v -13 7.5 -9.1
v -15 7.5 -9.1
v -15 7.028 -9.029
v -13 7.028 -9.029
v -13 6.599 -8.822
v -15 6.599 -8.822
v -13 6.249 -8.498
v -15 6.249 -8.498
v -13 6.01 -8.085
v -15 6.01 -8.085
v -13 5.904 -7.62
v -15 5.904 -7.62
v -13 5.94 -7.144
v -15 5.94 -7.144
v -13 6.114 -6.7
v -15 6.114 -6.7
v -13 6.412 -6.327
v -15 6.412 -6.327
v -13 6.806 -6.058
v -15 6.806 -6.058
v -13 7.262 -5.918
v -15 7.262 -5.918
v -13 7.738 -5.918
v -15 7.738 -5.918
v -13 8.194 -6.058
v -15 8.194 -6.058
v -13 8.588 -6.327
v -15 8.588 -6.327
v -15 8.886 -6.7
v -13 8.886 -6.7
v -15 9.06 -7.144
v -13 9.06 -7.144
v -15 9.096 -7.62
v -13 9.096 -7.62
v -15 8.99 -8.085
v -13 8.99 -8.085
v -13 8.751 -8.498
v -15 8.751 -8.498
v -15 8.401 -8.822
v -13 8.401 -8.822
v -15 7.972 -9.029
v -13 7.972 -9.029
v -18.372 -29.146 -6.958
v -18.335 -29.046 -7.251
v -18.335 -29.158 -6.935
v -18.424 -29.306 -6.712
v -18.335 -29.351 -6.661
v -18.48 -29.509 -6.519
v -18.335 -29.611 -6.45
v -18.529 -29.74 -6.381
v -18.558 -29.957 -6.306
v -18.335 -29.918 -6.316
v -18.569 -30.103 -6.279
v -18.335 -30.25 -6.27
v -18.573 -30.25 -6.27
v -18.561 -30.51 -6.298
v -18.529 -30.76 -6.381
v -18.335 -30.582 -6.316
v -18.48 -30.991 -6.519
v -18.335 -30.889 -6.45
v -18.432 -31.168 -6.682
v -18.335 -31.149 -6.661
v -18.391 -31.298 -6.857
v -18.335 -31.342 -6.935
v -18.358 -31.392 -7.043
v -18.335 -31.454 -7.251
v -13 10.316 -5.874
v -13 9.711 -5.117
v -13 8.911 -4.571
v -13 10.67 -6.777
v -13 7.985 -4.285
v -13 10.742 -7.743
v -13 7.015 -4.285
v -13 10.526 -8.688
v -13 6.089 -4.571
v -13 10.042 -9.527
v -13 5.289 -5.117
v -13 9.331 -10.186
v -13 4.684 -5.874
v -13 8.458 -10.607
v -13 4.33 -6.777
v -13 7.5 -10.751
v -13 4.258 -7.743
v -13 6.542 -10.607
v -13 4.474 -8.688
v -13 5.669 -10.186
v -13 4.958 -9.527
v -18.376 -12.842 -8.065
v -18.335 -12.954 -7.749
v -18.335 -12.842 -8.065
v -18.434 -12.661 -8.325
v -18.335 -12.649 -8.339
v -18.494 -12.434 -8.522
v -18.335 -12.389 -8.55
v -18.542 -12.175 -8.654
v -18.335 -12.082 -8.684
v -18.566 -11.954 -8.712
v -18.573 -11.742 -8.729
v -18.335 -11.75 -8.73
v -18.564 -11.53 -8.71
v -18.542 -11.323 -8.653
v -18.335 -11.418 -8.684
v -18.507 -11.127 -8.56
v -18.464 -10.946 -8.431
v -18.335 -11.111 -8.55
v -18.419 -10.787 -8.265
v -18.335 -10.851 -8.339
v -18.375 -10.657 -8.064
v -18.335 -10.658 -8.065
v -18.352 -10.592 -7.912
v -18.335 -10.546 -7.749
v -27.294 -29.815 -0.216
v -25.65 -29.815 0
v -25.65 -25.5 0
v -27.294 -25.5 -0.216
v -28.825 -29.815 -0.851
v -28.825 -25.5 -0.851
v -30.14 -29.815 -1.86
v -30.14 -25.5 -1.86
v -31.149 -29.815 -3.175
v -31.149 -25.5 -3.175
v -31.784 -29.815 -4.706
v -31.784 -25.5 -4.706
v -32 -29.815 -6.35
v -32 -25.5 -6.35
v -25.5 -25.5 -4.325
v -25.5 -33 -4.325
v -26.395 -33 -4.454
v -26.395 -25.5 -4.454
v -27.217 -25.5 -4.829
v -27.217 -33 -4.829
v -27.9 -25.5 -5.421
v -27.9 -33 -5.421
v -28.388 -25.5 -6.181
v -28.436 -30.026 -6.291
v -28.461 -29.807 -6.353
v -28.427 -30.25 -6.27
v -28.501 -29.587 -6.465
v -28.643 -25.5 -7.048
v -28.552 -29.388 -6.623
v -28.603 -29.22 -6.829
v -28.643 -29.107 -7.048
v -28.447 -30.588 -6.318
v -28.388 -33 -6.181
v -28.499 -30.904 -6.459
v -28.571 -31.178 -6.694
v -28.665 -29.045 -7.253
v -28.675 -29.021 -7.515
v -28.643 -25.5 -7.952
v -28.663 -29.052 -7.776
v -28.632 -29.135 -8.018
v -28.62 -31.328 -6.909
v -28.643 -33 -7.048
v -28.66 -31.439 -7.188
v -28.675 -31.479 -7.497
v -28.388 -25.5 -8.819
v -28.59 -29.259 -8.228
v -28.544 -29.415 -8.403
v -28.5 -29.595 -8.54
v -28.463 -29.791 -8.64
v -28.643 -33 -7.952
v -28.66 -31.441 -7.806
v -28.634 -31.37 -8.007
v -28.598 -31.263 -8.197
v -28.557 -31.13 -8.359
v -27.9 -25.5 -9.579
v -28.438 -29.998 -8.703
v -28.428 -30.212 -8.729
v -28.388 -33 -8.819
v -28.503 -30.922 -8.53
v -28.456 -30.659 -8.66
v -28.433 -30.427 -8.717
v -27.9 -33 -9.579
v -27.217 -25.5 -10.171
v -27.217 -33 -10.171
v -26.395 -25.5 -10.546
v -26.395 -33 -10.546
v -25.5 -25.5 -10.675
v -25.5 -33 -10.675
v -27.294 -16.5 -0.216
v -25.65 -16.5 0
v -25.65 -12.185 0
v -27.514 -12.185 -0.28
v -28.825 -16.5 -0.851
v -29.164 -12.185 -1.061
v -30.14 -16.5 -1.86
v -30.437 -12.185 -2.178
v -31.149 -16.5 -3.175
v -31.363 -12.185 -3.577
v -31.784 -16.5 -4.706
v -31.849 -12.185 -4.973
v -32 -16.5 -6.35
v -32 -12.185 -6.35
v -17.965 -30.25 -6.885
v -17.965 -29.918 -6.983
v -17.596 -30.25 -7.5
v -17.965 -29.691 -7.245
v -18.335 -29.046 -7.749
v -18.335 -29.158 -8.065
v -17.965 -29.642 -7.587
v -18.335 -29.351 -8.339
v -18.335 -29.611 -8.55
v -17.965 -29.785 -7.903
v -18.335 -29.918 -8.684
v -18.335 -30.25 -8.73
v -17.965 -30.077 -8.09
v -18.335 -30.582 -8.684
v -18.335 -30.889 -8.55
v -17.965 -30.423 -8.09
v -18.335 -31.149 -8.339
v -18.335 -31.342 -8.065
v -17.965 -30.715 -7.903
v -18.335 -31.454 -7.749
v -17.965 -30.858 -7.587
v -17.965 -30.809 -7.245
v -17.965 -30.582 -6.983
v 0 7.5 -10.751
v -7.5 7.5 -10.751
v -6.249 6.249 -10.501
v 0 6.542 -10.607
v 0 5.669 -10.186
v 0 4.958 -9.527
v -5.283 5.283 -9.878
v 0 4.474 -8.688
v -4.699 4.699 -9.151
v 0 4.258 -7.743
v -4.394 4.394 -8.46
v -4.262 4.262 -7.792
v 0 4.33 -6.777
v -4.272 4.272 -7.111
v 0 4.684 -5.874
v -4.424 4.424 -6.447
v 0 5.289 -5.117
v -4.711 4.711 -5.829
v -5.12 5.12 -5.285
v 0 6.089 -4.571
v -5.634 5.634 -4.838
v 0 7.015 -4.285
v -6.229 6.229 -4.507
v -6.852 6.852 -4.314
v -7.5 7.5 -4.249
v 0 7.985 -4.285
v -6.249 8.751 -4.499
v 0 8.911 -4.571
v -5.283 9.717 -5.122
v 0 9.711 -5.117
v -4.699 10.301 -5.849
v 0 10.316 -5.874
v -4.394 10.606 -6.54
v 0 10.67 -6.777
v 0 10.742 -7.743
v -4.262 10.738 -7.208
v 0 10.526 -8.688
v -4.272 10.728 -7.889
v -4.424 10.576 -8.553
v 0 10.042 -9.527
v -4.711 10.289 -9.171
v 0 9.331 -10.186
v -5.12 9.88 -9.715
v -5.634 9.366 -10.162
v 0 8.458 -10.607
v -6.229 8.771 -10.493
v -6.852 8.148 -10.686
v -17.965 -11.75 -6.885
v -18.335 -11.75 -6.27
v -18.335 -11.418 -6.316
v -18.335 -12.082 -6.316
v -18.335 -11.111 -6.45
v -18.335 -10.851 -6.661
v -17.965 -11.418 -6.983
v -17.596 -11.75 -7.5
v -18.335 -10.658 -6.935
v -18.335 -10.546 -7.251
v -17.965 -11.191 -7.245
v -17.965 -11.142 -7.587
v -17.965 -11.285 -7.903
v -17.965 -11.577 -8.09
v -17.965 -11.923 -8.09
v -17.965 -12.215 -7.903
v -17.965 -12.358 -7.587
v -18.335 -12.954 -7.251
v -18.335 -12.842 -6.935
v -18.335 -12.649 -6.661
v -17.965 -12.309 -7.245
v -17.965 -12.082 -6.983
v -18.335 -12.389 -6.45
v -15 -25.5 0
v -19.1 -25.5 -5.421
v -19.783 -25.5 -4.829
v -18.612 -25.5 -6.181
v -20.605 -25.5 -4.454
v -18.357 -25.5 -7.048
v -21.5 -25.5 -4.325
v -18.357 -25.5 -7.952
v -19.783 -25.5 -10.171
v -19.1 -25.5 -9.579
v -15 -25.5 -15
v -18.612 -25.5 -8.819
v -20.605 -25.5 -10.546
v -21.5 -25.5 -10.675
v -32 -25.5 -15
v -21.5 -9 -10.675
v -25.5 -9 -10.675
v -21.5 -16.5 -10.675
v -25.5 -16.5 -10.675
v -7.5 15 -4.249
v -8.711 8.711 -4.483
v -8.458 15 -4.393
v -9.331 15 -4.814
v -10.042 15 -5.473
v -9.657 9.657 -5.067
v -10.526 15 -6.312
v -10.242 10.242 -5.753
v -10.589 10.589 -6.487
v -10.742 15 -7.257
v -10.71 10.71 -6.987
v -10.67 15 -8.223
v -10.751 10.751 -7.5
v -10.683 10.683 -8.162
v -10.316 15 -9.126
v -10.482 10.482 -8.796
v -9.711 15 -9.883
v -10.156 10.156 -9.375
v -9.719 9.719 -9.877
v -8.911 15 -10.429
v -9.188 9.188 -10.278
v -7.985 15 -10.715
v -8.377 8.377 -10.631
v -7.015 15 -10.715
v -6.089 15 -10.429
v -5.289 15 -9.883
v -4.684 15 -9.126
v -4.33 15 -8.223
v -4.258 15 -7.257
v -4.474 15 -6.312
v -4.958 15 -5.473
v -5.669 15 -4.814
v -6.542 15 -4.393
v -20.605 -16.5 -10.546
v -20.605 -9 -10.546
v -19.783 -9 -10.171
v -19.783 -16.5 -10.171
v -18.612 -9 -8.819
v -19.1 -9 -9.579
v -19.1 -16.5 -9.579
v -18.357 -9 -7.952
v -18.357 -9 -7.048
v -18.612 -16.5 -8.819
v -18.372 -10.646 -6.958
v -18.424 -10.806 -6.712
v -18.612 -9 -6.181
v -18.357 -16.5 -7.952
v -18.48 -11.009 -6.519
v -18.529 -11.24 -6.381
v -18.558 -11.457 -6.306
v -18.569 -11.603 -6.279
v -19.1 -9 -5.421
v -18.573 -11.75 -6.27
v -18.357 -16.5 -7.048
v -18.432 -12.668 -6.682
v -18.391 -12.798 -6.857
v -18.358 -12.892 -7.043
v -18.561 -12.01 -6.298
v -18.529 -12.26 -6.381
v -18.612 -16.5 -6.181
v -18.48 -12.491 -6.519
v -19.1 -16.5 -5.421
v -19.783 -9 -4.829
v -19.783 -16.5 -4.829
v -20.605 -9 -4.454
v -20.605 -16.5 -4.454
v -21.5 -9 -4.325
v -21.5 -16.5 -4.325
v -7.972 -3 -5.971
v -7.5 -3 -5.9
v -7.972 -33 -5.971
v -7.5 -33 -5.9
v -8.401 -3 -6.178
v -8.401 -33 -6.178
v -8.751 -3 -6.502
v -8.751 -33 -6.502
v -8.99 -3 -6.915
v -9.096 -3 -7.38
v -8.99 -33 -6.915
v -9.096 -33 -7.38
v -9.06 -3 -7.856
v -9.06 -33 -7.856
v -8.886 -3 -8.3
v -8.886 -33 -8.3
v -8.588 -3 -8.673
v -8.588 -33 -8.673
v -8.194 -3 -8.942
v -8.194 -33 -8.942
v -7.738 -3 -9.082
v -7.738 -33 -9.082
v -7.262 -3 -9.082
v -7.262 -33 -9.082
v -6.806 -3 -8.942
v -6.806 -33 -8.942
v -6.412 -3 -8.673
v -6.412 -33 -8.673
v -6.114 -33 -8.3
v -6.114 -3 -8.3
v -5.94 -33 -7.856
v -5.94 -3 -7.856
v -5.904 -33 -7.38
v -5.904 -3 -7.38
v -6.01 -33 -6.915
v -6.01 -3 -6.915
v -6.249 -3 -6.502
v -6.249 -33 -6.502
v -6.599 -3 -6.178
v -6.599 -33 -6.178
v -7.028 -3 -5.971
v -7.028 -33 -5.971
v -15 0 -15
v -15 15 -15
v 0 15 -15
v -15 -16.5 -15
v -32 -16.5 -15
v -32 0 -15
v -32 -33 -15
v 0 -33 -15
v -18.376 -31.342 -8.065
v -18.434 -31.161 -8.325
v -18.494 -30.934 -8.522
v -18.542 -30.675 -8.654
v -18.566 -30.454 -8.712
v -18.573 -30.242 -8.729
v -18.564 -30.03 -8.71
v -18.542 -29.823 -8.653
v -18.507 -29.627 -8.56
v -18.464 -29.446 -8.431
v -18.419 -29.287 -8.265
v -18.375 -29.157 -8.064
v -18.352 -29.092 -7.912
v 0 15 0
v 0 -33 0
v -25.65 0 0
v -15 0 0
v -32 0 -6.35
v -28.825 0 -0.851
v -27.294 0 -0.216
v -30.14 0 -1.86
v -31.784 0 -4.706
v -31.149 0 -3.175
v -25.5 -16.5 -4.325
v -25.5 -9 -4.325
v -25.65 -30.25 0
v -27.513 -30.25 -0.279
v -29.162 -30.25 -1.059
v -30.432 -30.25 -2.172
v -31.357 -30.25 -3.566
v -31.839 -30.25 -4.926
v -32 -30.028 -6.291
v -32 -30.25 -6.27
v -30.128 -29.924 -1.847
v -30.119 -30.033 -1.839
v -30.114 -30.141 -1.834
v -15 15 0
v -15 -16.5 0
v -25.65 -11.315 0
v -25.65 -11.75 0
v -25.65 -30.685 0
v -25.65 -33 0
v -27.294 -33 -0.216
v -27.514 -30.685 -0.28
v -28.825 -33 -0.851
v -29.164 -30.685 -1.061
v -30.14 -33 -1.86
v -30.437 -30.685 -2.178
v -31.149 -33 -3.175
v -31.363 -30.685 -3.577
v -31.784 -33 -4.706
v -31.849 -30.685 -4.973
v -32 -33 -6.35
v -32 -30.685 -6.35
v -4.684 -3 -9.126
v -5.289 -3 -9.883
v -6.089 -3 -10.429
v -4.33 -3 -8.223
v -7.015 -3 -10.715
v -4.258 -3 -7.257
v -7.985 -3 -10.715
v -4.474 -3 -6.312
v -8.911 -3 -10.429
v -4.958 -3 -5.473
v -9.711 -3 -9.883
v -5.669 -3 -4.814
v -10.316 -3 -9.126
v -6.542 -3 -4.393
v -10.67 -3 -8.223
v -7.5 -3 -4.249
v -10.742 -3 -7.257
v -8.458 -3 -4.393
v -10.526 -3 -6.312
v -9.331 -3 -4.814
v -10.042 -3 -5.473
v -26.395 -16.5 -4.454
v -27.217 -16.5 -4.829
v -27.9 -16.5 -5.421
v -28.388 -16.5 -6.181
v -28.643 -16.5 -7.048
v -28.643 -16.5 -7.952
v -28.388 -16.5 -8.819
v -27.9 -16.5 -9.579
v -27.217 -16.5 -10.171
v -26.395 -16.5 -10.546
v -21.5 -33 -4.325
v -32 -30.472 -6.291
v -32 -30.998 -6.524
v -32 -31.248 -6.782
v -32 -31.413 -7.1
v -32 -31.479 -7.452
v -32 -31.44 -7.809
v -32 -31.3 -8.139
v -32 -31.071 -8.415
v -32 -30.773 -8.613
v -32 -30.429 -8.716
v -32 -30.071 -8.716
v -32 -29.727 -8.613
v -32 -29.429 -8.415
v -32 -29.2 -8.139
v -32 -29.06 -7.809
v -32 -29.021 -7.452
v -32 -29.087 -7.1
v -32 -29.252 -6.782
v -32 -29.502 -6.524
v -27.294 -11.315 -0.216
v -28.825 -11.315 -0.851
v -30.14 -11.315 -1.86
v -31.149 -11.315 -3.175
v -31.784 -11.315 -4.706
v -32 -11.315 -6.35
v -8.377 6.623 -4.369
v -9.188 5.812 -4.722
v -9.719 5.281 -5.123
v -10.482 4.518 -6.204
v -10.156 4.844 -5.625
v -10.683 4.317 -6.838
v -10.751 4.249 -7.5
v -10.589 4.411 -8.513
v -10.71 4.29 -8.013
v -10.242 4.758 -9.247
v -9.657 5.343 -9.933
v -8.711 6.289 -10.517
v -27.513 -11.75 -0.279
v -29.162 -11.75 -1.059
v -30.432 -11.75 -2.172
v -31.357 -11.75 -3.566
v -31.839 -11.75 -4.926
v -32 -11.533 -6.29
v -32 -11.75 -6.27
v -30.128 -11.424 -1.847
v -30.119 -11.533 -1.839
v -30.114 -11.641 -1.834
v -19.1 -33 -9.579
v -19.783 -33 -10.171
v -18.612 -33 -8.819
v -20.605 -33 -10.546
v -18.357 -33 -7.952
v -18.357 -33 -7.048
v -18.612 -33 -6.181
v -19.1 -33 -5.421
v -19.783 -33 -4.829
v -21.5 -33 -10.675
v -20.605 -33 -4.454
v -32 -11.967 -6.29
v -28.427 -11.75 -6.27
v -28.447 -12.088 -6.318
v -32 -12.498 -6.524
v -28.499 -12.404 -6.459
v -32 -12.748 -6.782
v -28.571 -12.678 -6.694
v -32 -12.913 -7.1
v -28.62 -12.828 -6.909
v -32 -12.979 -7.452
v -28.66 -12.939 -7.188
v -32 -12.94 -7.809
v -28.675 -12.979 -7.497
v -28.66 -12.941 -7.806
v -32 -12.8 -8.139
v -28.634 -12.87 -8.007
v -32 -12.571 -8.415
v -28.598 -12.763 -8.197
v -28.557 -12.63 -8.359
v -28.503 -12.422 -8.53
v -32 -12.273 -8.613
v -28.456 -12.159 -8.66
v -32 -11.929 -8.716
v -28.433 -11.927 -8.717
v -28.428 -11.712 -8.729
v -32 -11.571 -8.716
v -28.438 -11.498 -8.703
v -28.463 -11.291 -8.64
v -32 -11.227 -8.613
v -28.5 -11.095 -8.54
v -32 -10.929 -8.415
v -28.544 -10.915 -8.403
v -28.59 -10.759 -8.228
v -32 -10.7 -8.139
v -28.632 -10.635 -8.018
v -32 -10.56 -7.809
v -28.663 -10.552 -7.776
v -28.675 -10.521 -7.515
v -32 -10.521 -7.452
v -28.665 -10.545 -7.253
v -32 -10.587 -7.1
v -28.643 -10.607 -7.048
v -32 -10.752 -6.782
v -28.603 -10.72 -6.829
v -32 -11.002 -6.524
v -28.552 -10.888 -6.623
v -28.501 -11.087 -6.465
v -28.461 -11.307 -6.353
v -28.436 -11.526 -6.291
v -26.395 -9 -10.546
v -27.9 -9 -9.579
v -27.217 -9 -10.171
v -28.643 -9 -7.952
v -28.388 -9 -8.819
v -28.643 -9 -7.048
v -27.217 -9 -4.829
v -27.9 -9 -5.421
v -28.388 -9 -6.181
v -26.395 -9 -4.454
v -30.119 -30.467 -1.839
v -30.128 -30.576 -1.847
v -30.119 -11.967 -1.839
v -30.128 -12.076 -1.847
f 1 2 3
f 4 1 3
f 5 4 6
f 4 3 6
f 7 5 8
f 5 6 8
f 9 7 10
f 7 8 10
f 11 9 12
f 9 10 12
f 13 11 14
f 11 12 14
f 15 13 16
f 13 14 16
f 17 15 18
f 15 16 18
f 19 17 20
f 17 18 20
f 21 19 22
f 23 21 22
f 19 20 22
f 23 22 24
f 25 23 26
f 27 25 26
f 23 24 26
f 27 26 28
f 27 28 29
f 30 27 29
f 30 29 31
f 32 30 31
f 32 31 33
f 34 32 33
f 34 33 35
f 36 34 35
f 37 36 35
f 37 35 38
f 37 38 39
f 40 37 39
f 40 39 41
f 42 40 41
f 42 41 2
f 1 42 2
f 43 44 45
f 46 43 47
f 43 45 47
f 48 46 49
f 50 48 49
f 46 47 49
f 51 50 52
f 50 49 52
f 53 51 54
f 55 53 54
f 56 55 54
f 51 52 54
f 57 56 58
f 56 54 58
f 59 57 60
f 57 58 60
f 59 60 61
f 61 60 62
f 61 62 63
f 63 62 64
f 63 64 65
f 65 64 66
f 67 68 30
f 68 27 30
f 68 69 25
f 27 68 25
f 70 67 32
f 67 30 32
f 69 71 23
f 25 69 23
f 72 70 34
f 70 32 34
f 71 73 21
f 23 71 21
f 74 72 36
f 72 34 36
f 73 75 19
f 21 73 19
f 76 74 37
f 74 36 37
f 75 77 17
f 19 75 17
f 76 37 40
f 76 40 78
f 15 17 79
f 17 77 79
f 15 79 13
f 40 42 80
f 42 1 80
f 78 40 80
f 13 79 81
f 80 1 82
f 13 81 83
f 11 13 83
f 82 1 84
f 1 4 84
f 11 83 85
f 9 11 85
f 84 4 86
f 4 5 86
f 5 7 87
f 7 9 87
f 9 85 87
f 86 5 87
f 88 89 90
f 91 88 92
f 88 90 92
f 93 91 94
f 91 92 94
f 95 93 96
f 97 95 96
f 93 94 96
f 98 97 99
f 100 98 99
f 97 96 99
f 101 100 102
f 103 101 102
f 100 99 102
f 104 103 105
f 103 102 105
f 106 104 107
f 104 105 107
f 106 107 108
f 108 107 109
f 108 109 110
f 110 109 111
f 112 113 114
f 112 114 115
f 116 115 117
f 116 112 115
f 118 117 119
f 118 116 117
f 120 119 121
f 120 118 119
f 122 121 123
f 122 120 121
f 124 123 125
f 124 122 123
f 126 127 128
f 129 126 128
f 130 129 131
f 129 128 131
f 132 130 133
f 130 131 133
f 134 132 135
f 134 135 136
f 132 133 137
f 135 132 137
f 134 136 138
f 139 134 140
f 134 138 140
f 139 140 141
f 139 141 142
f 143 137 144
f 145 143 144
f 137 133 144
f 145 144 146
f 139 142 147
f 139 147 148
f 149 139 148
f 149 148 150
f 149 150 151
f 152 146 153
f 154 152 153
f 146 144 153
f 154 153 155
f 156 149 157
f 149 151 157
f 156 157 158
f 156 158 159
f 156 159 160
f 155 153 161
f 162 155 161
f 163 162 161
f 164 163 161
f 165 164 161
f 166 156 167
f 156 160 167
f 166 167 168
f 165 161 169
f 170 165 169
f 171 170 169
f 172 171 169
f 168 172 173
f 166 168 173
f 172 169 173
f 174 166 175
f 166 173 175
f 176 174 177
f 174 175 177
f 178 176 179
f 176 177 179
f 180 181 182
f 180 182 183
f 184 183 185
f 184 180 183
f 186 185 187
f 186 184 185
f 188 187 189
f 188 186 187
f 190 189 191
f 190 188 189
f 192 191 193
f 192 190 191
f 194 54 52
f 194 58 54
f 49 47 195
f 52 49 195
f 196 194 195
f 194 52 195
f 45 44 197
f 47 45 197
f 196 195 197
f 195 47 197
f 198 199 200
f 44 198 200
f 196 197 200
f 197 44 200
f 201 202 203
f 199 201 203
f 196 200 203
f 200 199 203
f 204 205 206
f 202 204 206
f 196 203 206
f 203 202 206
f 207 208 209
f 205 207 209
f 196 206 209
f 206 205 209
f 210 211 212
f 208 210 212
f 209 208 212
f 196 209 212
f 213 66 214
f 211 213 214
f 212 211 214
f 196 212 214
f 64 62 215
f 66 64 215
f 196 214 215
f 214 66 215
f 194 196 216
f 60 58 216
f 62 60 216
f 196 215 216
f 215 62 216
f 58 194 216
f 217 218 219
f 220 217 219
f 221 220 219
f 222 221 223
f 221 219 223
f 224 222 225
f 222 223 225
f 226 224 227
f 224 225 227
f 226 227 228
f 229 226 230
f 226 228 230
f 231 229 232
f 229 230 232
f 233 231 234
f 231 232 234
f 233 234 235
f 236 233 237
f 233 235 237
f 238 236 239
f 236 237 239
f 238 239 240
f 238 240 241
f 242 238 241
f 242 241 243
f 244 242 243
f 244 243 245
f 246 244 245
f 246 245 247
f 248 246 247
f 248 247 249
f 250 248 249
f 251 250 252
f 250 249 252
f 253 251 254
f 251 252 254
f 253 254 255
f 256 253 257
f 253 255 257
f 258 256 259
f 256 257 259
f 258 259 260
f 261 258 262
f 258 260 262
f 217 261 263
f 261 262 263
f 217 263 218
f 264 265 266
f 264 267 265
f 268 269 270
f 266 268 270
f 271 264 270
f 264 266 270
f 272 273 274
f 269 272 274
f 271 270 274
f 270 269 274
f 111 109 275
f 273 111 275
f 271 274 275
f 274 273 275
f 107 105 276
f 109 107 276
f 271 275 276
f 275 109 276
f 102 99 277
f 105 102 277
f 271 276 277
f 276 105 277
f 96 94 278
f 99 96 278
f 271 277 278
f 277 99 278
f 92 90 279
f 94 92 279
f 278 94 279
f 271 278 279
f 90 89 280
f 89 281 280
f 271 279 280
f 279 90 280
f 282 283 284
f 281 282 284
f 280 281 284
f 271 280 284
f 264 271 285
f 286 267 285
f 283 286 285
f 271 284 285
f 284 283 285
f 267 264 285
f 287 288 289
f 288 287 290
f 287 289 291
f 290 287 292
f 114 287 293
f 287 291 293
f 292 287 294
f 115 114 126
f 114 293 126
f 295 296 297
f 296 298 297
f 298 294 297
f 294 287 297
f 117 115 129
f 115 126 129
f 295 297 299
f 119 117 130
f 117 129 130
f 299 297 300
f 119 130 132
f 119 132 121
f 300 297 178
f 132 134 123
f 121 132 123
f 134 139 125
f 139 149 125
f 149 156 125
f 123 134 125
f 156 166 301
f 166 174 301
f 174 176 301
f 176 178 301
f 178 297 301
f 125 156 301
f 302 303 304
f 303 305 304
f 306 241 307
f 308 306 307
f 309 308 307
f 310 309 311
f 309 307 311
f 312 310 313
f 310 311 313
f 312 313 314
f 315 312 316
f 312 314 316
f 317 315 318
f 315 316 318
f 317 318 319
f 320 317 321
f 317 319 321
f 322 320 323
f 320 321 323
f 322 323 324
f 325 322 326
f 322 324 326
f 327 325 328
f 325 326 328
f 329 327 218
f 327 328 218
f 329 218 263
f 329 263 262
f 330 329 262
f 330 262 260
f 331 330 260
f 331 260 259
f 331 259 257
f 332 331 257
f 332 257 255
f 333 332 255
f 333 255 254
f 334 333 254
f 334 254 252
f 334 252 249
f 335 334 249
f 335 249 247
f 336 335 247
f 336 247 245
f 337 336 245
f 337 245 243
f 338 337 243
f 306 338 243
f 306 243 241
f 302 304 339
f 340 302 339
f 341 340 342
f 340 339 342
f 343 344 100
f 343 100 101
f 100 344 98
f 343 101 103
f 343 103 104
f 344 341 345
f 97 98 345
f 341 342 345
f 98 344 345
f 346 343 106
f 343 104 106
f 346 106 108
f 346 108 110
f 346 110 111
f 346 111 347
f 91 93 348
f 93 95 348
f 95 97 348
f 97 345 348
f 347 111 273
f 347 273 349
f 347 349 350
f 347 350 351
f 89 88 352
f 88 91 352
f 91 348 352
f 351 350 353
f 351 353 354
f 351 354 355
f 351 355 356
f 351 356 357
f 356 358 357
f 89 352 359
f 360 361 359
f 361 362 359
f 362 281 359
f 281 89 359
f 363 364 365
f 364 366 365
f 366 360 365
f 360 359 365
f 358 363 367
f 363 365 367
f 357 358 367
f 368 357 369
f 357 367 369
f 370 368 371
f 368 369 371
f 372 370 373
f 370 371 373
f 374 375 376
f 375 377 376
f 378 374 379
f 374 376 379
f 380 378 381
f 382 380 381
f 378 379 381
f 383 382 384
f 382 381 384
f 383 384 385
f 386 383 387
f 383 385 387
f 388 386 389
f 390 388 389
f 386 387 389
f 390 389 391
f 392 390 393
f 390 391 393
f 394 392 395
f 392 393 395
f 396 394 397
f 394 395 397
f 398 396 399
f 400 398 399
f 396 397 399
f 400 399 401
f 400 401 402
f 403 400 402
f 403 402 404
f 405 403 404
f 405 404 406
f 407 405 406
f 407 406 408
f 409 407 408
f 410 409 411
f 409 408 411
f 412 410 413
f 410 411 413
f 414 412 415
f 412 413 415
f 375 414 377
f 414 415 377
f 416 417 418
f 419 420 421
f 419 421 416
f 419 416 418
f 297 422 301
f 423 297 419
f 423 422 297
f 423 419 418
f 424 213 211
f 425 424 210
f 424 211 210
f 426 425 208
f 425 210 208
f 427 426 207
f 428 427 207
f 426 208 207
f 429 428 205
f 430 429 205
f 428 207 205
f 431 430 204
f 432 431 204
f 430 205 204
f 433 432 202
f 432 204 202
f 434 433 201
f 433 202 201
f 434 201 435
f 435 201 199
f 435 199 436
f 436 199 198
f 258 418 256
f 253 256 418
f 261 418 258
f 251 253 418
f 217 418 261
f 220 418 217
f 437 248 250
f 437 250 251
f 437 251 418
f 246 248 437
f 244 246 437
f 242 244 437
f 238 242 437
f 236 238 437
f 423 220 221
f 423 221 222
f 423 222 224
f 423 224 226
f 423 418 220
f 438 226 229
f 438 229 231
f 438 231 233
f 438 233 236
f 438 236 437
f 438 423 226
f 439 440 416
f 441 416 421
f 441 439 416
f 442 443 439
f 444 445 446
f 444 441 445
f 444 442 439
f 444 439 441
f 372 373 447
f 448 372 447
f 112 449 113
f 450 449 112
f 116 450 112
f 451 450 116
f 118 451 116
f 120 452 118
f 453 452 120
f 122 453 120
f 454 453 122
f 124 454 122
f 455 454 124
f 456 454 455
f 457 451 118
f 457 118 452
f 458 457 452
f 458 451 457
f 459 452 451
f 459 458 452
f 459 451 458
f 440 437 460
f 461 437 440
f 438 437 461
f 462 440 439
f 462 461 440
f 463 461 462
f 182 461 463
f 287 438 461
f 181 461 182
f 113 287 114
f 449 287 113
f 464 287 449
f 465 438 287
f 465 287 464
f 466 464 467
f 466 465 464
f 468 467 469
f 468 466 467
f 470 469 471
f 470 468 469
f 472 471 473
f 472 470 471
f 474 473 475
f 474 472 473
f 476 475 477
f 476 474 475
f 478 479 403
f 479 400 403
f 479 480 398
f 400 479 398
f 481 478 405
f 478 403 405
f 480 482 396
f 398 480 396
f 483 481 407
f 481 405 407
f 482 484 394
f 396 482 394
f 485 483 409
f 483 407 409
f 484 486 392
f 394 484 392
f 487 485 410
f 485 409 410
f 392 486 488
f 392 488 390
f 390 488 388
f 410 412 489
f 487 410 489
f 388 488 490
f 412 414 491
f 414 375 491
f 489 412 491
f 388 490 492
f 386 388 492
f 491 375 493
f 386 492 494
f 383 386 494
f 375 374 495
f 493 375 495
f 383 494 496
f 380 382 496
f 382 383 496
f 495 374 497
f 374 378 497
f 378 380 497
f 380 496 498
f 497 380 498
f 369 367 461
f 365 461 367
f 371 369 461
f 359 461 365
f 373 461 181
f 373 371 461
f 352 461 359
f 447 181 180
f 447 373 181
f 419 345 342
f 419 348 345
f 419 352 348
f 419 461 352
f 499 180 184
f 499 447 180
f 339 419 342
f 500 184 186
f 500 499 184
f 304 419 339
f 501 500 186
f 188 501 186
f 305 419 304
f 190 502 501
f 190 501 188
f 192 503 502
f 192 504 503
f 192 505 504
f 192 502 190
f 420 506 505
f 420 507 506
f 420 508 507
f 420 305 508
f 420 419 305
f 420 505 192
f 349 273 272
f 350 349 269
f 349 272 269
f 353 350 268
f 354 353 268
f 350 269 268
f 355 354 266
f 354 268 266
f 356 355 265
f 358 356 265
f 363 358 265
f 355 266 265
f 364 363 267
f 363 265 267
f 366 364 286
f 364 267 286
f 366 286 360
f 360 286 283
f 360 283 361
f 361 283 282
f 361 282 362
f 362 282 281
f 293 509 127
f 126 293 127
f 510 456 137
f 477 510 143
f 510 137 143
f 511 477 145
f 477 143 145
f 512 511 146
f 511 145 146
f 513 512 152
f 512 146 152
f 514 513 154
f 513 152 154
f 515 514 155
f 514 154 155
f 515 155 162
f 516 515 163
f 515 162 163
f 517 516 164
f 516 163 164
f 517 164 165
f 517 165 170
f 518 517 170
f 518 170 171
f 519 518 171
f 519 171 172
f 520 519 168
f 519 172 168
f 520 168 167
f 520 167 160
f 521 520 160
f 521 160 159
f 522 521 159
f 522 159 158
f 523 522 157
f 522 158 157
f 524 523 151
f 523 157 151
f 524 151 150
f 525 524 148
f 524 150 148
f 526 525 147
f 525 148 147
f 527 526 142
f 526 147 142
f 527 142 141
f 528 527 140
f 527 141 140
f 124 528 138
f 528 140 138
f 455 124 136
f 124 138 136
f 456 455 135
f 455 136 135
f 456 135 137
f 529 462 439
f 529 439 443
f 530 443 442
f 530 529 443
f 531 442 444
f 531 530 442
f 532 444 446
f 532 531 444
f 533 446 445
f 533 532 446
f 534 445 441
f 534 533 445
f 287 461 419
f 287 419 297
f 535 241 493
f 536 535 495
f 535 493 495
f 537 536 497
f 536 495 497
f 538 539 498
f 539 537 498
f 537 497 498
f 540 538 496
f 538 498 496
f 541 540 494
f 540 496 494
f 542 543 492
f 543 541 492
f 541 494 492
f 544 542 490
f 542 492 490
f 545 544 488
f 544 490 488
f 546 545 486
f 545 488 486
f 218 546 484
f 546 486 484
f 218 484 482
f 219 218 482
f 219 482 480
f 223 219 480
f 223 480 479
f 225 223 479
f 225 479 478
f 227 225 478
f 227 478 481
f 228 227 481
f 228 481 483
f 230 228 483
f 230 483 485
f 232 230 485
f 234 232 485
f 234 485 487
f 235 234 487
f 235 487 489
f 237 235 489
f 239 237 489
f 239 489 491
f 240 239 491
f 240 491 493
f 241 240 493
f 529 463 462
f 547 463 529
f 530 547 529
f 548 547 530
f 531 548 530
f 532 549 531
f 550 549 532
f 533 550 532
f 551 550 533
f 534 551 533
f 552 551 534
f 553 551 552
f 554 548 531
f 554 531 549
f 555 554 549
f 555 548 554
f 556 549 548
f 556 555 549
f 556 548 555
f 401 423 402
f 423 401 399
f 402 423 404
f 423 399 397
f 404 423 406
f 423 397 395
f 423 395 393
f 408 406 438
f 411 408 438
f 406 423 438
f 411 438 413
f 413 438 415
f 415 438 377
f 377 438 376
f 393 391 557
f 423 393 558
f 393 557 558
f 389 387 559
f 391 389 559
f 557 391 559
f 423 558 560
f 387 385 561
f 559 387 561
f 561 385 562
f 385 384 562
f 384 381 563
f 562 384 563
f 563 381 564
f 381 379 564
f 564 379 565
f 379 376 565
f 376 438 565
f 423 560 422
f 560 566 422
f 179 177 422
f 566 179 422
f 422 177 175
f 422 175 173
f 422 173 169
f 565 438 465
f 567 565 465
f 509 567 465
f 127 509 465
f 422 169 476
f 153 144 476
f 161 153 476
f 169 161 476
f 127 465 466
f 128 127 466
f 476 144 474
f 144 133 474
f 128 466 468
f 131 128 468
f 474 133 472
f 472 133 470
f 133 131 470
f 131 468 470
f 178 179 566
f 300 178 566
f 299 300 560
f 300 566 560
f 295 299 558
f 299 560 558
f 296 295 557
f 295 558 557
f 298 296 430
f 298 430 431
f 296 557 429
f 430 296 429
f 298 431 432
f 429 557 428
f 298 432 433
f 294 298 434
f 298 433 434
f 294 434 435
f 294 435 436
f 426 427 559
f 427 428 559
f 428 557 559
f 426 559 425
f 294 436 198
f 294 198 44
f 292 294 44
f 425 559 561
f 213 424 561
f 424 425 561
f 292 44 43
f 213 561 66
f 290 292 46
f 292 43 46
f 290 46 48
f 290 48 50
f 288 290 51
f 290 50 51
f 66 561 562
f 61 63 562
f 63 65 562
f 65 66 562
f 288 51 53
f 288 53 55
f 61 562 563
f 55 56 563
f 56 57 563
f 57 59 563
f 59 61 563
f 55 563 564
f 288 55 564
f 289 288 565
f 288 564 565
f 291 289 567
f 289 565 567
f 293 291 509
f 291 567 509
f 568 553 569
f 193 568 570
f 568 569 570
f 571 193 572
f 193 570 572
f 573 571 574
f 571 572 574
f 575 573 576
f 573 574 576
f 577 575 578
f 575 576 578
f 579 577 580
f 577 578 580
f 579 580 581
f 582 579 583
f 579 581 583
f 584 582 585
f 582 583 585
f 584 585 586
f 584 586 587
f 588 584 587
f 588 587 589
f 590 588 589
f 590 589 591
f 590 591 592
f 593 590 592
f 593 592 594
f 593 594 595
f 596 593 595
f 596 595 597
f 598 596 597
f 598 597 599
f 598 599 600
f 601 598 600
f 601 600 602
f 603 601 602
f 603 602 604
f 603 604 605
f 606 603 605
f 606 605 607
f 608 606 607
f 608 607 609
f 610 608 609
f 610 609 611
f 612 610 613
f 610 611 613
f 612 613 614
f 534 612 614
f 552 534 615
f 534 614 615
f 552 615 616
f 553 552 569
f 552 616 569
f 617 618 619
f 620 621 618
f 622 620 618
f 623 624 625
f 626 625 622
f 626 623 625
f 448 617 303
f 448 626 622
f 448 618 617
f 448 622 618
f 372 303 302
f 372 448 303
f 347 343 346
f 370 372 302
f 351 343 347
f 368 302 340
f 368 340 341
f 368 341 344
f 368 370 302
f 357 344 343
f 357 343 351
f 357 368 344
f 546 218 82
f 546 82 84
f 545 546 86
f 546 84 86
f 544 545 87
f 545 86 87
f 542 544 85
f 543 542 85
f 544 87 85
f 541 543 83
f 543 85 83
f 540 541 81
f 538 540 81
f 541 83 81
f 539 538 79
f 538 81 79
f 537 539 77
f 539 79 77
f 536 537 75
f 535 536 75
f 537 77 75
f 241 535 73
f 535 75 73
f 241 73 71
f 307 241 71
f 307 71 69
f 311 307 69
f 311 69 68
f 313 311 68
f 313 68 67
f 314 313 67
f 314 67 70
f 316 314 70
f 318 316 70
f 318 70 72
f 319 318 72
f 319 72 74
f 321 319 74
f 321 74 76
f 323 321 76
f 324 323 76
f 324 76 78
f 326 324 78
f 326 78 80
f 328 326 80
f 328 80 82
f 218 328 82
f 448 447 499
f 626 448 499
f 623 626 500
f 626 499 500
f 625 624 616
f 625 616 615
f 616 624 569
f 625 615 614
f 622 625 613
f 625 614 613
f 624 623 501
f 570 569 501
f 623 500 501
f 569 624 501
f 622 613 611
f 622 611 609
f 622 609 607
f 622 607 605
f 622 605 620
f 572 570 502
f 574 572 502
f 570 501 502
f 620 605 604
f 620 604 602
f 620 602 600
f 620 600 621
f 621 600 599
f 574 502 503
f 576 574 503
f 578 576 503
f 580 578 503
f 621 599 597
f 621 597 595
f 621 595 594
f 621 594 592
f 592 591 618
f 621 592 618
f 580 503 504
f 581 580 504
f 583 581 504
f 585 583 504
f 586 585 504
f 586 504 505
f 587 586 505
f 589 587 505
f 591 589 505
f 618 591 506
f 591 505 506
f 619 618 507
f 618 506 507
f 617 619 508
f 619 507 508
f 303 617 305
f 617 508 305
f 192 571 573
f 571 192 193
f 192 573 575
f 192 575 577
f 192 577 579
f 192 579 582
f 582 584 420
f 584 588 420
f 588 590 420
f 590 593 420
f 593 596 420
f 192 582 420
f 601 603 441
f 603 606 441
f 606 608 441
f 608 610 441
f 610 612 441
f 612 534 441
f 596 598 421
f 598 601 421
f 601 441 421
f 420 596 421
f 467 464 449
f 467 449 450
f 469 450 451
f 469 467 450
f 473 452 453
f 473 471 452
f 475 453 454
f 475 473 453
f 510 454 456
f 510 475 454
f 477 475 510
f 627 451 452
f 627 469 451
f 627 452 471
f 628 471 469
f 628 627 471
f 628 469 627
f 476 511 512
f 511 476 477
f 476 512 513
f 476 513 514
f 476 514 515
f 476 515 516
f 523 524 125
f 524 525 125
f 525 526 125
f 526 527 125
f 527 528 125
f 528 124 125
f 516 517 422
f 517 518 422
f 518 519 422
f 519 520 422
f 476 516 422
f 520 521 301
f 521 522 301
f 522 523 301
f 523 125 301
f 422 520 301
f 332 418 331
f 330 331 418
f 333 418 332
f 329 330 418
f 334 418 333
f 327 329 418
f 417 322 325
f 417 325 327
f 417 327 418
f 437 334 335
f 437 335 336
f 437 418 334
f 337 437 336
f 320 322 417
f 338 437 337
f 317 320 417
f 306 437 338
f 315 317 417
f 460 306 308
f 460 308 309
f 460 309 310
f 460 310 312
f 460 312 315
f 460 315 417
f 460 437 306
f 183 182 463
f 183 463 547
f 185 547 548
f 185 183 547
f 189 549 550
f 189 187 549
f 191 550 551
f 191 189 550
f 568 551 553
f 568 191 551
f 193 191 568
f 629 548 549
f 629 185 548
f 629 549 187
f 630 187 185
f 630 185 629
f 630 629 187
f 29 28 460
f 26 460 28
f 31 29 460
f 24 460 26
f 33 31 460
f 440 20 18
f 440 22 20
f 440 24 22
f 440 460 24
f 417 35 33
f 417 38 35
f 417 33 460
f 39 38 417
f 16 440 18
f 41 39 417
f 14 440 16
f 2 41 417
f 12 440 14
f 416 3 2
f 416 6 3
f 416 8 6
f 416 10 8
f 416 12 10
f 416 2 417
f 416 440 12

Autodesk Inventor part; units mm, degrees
ref_plane "YZ Plane" through (0, 0, 0) normal (1, 0, 0) x (0, 1, 0)
ref_plane "XZ Plane" through (0, 0, 0) normal (0, 1, 0) x (-1, 0, 0)
ref_plane "XY Plane" through (0, 0, 0) normal (0, 0, 1) x (1, 0, 0)
sketch "Base Profile" plane through (0, 0, 0) normal (0, 1, 0) x (-1, 0, 0)
  line L0 (0, 0) -> (15, 0)
  line L1 (15, 0) -> (15, -15)
  line L2 (15, -15) -> (0, -15)
  line L3 (0, -15) -> (0, 0)
  line L4 (15, 0) -> (32, 0)
  line L5 (32, 0) -> (32, -15)
  line L6 (32, -15) -> (15, -15)
  line L7 (15, -15) -> (15, 0)
  dimension "d164" = 15
  dimension "d165" = 15
  dimension "d166" = 17
  dimension "d167" = 15
extrude "Stock" add sketch "Base Profile" against normal blind 33
extrude "Extrusion Post" add sketch "Base Profile" along normal blind 15 contours L0 L1 L2 L3
sketch "Sketch27" plane through (0, -33, -15) normal (0, 0, -1) x (-1, 0, 0)
  line L0 (0, 0) -> (0, 48) projected
  line L1 (32, 0) -> (0, 0) projected
  line L2 (32, 33) -> (32, 0) projected
  line L3 (15, 33) -> (32, 33) projected
  line L4 (15, 33) -> (15, 48) projected
  line L5 (0, 48) -> (15, 48) projected
  line L6 (0, 16.5) -> (32, 16.5)
  line L7 (0, 7.5) -> (32, 7.5)
  line L8 (15, 33) -> (15, 0)
  point P0 (15, 16.5)
  point P1 (15, 7.5)
  dimension "d247" = 16.5
  dimension "d290" = 7.5
extrude "Lower Half Cut" cut sketch "Sketch27" against normal through all contours L8 L6 L2 L7
sketch "Bottom Profile" plane through (-35, -33, -15) normal (0, -1, 0) x (1, 0, 0)
  line L0 (13.5, 7.5) -> (9.5, 7.5) construction
  line L1 (13.5, 10.675) -> (9.5, 10.675)
  line L2 (9.5, 4.325) -> (13.5, 4.325)
  arc A0 (13.5, 4.325) -> (13.5, 10.675) centre (13.5, 7.5) ccw
  arc A1 (9.5, 10.675) -> (9.5, 4.325) centre (9.5, 7.5) ccw
  line L3 (3, 15) -> (3, 0) projected
  line L4 (35, 15) -> (3, 15) projected
  point P0 (11.5, 7.5)
  dimension "d291" = 4
  dimension "d292" = 6.35
  dimension "d293" = 6.5
  dimension "d294" = 7.5
extrude "Slot Cut" cut sketch "Bottom Profile" against normal blind 24
sketch "Front Hole Pattern" plane through (0, -33, 0) normal (1, 0, 0) x (0, 0, -1)
  line L0 (0, 0) -> (0, 48) projected
  circle A0 centre (7.5, 40.5) radius 3.175
  line L1 (0, 48) -> (15, 48) projected
  dimension "d317" = 6.35
  dimension "d318" = 7.5
  dimension "d319" = 7.5
sketch "Rear Hole Patttern" plane through (-32, -33, -15) normal (-1, 0, 0) x (0, 0, 1)
  line L0 (15, 7.5) -> (0, 7.5) projected
  line L1 (0, 7.5) -> (0, 0) projected
  line L2 (15, 0) -> (0, 0) projected
  line L3 (15, 7.5) -> (15, 0) projected
  line L4 (0, 5.5) -> (15, 5.5) construction
  circle A0 centre (7.5, 2.75) radius 1.5
  line L5 (0, 16.5) -> (15, 16.5) projected
  line L6 (15, 33) -> (15, 16.5) projected
  line L7 (0, 33) -> (15, 33) projected
  line L8 (0, 33) -> (0, 16.5) projected
  line L9 (0, 18.5) -> (15, 18.5) construction
  line L10 (0, 24) -> (15, 24) construction
  circle A1 centre (7.5, 21.25) radius 1.5
  dimension "d328" = 2
  dimension "d329" = 7.5
  dimension "d330" = 3
  dimension "d331" = 7.5
  dimension "d332" = 2.75
  dimension "d350" = 2
  dimension "d351" = 7.5
  dimension "d352" = 3
  dimension "d353" = 2.75
hole "Rear Holes" at (-32, -30.25, -7.5) at (-32, -11.75, -7.5) direction (1, 0, 0) diameter 2.459 depth 13.6652 tip angle 118 thread size "M3x0.5" class "6H" standard "ANSI Metric M Profile"
hole "Front Mounting Hole" at (0, 7.5, -7.5) direction (-1, 0, 0) diameter 3.2004 end through all counterbore diameter 6.5024 counterbore depth 13 clearance for "Socket Head Cap Screw" size "M3" standard "Ansi Metric M Profile"
sketch "Sketch33" plane through (0, 15, 0) normal (0, 1, 0) x (1, 0, 0)
  line L0 (-15, 15) -> (-15, 0) projected
  line L1 (-15, 0) -> (0, 0) projected
  line L2 (0, 0) -> (0, 15) projected
  line L3 (0, 15) -> (-15, 15) projected
  circle A0 centre (-7.5, 7.5) radius 3.175
  dimension "d340" = 6.35
  dimension "d341" = 7.5
  dimension "d342" = 7.5
hole "Top Mounting Hole" at (-7.5, 15, -7.5) direction (0, -1, 0) diameter 3.2004 end through all counterbore diameter 6.5024 counterbore depth 18 clearance for "Socket Head Cap Screw" size "M3" standard "Ansi Metric M Profile"
fillet "Fillet2" radius 6.35 2 edges at (-32, -29.25, 0) (-32, -8.25, 0)
equation "\"d164\" = extrusionWidth"
equation "\"d165\" = extrusionWidth"
equation "\"d166\" = idlerLength"
equation "\"d167\" = d165"
equation "\"d168\" = extrusionOffset"
equation "\"extrusionWidth\" = 15"
equation "\"idlerLength\" = 17"
equation "\"bearingOffsetFromBottom\" = 7.5"
equation "\"extrusionOffset\" = 33"
equation "\"bearingStackHeight\" = 9"
equation "\"bearingSlotLength\" = 4"
equation "\"bearingClearance\" = 13"
equation "\"pinSupportLength\" = 2"
properties part number "A Idler" material "Aluminum 6061"
